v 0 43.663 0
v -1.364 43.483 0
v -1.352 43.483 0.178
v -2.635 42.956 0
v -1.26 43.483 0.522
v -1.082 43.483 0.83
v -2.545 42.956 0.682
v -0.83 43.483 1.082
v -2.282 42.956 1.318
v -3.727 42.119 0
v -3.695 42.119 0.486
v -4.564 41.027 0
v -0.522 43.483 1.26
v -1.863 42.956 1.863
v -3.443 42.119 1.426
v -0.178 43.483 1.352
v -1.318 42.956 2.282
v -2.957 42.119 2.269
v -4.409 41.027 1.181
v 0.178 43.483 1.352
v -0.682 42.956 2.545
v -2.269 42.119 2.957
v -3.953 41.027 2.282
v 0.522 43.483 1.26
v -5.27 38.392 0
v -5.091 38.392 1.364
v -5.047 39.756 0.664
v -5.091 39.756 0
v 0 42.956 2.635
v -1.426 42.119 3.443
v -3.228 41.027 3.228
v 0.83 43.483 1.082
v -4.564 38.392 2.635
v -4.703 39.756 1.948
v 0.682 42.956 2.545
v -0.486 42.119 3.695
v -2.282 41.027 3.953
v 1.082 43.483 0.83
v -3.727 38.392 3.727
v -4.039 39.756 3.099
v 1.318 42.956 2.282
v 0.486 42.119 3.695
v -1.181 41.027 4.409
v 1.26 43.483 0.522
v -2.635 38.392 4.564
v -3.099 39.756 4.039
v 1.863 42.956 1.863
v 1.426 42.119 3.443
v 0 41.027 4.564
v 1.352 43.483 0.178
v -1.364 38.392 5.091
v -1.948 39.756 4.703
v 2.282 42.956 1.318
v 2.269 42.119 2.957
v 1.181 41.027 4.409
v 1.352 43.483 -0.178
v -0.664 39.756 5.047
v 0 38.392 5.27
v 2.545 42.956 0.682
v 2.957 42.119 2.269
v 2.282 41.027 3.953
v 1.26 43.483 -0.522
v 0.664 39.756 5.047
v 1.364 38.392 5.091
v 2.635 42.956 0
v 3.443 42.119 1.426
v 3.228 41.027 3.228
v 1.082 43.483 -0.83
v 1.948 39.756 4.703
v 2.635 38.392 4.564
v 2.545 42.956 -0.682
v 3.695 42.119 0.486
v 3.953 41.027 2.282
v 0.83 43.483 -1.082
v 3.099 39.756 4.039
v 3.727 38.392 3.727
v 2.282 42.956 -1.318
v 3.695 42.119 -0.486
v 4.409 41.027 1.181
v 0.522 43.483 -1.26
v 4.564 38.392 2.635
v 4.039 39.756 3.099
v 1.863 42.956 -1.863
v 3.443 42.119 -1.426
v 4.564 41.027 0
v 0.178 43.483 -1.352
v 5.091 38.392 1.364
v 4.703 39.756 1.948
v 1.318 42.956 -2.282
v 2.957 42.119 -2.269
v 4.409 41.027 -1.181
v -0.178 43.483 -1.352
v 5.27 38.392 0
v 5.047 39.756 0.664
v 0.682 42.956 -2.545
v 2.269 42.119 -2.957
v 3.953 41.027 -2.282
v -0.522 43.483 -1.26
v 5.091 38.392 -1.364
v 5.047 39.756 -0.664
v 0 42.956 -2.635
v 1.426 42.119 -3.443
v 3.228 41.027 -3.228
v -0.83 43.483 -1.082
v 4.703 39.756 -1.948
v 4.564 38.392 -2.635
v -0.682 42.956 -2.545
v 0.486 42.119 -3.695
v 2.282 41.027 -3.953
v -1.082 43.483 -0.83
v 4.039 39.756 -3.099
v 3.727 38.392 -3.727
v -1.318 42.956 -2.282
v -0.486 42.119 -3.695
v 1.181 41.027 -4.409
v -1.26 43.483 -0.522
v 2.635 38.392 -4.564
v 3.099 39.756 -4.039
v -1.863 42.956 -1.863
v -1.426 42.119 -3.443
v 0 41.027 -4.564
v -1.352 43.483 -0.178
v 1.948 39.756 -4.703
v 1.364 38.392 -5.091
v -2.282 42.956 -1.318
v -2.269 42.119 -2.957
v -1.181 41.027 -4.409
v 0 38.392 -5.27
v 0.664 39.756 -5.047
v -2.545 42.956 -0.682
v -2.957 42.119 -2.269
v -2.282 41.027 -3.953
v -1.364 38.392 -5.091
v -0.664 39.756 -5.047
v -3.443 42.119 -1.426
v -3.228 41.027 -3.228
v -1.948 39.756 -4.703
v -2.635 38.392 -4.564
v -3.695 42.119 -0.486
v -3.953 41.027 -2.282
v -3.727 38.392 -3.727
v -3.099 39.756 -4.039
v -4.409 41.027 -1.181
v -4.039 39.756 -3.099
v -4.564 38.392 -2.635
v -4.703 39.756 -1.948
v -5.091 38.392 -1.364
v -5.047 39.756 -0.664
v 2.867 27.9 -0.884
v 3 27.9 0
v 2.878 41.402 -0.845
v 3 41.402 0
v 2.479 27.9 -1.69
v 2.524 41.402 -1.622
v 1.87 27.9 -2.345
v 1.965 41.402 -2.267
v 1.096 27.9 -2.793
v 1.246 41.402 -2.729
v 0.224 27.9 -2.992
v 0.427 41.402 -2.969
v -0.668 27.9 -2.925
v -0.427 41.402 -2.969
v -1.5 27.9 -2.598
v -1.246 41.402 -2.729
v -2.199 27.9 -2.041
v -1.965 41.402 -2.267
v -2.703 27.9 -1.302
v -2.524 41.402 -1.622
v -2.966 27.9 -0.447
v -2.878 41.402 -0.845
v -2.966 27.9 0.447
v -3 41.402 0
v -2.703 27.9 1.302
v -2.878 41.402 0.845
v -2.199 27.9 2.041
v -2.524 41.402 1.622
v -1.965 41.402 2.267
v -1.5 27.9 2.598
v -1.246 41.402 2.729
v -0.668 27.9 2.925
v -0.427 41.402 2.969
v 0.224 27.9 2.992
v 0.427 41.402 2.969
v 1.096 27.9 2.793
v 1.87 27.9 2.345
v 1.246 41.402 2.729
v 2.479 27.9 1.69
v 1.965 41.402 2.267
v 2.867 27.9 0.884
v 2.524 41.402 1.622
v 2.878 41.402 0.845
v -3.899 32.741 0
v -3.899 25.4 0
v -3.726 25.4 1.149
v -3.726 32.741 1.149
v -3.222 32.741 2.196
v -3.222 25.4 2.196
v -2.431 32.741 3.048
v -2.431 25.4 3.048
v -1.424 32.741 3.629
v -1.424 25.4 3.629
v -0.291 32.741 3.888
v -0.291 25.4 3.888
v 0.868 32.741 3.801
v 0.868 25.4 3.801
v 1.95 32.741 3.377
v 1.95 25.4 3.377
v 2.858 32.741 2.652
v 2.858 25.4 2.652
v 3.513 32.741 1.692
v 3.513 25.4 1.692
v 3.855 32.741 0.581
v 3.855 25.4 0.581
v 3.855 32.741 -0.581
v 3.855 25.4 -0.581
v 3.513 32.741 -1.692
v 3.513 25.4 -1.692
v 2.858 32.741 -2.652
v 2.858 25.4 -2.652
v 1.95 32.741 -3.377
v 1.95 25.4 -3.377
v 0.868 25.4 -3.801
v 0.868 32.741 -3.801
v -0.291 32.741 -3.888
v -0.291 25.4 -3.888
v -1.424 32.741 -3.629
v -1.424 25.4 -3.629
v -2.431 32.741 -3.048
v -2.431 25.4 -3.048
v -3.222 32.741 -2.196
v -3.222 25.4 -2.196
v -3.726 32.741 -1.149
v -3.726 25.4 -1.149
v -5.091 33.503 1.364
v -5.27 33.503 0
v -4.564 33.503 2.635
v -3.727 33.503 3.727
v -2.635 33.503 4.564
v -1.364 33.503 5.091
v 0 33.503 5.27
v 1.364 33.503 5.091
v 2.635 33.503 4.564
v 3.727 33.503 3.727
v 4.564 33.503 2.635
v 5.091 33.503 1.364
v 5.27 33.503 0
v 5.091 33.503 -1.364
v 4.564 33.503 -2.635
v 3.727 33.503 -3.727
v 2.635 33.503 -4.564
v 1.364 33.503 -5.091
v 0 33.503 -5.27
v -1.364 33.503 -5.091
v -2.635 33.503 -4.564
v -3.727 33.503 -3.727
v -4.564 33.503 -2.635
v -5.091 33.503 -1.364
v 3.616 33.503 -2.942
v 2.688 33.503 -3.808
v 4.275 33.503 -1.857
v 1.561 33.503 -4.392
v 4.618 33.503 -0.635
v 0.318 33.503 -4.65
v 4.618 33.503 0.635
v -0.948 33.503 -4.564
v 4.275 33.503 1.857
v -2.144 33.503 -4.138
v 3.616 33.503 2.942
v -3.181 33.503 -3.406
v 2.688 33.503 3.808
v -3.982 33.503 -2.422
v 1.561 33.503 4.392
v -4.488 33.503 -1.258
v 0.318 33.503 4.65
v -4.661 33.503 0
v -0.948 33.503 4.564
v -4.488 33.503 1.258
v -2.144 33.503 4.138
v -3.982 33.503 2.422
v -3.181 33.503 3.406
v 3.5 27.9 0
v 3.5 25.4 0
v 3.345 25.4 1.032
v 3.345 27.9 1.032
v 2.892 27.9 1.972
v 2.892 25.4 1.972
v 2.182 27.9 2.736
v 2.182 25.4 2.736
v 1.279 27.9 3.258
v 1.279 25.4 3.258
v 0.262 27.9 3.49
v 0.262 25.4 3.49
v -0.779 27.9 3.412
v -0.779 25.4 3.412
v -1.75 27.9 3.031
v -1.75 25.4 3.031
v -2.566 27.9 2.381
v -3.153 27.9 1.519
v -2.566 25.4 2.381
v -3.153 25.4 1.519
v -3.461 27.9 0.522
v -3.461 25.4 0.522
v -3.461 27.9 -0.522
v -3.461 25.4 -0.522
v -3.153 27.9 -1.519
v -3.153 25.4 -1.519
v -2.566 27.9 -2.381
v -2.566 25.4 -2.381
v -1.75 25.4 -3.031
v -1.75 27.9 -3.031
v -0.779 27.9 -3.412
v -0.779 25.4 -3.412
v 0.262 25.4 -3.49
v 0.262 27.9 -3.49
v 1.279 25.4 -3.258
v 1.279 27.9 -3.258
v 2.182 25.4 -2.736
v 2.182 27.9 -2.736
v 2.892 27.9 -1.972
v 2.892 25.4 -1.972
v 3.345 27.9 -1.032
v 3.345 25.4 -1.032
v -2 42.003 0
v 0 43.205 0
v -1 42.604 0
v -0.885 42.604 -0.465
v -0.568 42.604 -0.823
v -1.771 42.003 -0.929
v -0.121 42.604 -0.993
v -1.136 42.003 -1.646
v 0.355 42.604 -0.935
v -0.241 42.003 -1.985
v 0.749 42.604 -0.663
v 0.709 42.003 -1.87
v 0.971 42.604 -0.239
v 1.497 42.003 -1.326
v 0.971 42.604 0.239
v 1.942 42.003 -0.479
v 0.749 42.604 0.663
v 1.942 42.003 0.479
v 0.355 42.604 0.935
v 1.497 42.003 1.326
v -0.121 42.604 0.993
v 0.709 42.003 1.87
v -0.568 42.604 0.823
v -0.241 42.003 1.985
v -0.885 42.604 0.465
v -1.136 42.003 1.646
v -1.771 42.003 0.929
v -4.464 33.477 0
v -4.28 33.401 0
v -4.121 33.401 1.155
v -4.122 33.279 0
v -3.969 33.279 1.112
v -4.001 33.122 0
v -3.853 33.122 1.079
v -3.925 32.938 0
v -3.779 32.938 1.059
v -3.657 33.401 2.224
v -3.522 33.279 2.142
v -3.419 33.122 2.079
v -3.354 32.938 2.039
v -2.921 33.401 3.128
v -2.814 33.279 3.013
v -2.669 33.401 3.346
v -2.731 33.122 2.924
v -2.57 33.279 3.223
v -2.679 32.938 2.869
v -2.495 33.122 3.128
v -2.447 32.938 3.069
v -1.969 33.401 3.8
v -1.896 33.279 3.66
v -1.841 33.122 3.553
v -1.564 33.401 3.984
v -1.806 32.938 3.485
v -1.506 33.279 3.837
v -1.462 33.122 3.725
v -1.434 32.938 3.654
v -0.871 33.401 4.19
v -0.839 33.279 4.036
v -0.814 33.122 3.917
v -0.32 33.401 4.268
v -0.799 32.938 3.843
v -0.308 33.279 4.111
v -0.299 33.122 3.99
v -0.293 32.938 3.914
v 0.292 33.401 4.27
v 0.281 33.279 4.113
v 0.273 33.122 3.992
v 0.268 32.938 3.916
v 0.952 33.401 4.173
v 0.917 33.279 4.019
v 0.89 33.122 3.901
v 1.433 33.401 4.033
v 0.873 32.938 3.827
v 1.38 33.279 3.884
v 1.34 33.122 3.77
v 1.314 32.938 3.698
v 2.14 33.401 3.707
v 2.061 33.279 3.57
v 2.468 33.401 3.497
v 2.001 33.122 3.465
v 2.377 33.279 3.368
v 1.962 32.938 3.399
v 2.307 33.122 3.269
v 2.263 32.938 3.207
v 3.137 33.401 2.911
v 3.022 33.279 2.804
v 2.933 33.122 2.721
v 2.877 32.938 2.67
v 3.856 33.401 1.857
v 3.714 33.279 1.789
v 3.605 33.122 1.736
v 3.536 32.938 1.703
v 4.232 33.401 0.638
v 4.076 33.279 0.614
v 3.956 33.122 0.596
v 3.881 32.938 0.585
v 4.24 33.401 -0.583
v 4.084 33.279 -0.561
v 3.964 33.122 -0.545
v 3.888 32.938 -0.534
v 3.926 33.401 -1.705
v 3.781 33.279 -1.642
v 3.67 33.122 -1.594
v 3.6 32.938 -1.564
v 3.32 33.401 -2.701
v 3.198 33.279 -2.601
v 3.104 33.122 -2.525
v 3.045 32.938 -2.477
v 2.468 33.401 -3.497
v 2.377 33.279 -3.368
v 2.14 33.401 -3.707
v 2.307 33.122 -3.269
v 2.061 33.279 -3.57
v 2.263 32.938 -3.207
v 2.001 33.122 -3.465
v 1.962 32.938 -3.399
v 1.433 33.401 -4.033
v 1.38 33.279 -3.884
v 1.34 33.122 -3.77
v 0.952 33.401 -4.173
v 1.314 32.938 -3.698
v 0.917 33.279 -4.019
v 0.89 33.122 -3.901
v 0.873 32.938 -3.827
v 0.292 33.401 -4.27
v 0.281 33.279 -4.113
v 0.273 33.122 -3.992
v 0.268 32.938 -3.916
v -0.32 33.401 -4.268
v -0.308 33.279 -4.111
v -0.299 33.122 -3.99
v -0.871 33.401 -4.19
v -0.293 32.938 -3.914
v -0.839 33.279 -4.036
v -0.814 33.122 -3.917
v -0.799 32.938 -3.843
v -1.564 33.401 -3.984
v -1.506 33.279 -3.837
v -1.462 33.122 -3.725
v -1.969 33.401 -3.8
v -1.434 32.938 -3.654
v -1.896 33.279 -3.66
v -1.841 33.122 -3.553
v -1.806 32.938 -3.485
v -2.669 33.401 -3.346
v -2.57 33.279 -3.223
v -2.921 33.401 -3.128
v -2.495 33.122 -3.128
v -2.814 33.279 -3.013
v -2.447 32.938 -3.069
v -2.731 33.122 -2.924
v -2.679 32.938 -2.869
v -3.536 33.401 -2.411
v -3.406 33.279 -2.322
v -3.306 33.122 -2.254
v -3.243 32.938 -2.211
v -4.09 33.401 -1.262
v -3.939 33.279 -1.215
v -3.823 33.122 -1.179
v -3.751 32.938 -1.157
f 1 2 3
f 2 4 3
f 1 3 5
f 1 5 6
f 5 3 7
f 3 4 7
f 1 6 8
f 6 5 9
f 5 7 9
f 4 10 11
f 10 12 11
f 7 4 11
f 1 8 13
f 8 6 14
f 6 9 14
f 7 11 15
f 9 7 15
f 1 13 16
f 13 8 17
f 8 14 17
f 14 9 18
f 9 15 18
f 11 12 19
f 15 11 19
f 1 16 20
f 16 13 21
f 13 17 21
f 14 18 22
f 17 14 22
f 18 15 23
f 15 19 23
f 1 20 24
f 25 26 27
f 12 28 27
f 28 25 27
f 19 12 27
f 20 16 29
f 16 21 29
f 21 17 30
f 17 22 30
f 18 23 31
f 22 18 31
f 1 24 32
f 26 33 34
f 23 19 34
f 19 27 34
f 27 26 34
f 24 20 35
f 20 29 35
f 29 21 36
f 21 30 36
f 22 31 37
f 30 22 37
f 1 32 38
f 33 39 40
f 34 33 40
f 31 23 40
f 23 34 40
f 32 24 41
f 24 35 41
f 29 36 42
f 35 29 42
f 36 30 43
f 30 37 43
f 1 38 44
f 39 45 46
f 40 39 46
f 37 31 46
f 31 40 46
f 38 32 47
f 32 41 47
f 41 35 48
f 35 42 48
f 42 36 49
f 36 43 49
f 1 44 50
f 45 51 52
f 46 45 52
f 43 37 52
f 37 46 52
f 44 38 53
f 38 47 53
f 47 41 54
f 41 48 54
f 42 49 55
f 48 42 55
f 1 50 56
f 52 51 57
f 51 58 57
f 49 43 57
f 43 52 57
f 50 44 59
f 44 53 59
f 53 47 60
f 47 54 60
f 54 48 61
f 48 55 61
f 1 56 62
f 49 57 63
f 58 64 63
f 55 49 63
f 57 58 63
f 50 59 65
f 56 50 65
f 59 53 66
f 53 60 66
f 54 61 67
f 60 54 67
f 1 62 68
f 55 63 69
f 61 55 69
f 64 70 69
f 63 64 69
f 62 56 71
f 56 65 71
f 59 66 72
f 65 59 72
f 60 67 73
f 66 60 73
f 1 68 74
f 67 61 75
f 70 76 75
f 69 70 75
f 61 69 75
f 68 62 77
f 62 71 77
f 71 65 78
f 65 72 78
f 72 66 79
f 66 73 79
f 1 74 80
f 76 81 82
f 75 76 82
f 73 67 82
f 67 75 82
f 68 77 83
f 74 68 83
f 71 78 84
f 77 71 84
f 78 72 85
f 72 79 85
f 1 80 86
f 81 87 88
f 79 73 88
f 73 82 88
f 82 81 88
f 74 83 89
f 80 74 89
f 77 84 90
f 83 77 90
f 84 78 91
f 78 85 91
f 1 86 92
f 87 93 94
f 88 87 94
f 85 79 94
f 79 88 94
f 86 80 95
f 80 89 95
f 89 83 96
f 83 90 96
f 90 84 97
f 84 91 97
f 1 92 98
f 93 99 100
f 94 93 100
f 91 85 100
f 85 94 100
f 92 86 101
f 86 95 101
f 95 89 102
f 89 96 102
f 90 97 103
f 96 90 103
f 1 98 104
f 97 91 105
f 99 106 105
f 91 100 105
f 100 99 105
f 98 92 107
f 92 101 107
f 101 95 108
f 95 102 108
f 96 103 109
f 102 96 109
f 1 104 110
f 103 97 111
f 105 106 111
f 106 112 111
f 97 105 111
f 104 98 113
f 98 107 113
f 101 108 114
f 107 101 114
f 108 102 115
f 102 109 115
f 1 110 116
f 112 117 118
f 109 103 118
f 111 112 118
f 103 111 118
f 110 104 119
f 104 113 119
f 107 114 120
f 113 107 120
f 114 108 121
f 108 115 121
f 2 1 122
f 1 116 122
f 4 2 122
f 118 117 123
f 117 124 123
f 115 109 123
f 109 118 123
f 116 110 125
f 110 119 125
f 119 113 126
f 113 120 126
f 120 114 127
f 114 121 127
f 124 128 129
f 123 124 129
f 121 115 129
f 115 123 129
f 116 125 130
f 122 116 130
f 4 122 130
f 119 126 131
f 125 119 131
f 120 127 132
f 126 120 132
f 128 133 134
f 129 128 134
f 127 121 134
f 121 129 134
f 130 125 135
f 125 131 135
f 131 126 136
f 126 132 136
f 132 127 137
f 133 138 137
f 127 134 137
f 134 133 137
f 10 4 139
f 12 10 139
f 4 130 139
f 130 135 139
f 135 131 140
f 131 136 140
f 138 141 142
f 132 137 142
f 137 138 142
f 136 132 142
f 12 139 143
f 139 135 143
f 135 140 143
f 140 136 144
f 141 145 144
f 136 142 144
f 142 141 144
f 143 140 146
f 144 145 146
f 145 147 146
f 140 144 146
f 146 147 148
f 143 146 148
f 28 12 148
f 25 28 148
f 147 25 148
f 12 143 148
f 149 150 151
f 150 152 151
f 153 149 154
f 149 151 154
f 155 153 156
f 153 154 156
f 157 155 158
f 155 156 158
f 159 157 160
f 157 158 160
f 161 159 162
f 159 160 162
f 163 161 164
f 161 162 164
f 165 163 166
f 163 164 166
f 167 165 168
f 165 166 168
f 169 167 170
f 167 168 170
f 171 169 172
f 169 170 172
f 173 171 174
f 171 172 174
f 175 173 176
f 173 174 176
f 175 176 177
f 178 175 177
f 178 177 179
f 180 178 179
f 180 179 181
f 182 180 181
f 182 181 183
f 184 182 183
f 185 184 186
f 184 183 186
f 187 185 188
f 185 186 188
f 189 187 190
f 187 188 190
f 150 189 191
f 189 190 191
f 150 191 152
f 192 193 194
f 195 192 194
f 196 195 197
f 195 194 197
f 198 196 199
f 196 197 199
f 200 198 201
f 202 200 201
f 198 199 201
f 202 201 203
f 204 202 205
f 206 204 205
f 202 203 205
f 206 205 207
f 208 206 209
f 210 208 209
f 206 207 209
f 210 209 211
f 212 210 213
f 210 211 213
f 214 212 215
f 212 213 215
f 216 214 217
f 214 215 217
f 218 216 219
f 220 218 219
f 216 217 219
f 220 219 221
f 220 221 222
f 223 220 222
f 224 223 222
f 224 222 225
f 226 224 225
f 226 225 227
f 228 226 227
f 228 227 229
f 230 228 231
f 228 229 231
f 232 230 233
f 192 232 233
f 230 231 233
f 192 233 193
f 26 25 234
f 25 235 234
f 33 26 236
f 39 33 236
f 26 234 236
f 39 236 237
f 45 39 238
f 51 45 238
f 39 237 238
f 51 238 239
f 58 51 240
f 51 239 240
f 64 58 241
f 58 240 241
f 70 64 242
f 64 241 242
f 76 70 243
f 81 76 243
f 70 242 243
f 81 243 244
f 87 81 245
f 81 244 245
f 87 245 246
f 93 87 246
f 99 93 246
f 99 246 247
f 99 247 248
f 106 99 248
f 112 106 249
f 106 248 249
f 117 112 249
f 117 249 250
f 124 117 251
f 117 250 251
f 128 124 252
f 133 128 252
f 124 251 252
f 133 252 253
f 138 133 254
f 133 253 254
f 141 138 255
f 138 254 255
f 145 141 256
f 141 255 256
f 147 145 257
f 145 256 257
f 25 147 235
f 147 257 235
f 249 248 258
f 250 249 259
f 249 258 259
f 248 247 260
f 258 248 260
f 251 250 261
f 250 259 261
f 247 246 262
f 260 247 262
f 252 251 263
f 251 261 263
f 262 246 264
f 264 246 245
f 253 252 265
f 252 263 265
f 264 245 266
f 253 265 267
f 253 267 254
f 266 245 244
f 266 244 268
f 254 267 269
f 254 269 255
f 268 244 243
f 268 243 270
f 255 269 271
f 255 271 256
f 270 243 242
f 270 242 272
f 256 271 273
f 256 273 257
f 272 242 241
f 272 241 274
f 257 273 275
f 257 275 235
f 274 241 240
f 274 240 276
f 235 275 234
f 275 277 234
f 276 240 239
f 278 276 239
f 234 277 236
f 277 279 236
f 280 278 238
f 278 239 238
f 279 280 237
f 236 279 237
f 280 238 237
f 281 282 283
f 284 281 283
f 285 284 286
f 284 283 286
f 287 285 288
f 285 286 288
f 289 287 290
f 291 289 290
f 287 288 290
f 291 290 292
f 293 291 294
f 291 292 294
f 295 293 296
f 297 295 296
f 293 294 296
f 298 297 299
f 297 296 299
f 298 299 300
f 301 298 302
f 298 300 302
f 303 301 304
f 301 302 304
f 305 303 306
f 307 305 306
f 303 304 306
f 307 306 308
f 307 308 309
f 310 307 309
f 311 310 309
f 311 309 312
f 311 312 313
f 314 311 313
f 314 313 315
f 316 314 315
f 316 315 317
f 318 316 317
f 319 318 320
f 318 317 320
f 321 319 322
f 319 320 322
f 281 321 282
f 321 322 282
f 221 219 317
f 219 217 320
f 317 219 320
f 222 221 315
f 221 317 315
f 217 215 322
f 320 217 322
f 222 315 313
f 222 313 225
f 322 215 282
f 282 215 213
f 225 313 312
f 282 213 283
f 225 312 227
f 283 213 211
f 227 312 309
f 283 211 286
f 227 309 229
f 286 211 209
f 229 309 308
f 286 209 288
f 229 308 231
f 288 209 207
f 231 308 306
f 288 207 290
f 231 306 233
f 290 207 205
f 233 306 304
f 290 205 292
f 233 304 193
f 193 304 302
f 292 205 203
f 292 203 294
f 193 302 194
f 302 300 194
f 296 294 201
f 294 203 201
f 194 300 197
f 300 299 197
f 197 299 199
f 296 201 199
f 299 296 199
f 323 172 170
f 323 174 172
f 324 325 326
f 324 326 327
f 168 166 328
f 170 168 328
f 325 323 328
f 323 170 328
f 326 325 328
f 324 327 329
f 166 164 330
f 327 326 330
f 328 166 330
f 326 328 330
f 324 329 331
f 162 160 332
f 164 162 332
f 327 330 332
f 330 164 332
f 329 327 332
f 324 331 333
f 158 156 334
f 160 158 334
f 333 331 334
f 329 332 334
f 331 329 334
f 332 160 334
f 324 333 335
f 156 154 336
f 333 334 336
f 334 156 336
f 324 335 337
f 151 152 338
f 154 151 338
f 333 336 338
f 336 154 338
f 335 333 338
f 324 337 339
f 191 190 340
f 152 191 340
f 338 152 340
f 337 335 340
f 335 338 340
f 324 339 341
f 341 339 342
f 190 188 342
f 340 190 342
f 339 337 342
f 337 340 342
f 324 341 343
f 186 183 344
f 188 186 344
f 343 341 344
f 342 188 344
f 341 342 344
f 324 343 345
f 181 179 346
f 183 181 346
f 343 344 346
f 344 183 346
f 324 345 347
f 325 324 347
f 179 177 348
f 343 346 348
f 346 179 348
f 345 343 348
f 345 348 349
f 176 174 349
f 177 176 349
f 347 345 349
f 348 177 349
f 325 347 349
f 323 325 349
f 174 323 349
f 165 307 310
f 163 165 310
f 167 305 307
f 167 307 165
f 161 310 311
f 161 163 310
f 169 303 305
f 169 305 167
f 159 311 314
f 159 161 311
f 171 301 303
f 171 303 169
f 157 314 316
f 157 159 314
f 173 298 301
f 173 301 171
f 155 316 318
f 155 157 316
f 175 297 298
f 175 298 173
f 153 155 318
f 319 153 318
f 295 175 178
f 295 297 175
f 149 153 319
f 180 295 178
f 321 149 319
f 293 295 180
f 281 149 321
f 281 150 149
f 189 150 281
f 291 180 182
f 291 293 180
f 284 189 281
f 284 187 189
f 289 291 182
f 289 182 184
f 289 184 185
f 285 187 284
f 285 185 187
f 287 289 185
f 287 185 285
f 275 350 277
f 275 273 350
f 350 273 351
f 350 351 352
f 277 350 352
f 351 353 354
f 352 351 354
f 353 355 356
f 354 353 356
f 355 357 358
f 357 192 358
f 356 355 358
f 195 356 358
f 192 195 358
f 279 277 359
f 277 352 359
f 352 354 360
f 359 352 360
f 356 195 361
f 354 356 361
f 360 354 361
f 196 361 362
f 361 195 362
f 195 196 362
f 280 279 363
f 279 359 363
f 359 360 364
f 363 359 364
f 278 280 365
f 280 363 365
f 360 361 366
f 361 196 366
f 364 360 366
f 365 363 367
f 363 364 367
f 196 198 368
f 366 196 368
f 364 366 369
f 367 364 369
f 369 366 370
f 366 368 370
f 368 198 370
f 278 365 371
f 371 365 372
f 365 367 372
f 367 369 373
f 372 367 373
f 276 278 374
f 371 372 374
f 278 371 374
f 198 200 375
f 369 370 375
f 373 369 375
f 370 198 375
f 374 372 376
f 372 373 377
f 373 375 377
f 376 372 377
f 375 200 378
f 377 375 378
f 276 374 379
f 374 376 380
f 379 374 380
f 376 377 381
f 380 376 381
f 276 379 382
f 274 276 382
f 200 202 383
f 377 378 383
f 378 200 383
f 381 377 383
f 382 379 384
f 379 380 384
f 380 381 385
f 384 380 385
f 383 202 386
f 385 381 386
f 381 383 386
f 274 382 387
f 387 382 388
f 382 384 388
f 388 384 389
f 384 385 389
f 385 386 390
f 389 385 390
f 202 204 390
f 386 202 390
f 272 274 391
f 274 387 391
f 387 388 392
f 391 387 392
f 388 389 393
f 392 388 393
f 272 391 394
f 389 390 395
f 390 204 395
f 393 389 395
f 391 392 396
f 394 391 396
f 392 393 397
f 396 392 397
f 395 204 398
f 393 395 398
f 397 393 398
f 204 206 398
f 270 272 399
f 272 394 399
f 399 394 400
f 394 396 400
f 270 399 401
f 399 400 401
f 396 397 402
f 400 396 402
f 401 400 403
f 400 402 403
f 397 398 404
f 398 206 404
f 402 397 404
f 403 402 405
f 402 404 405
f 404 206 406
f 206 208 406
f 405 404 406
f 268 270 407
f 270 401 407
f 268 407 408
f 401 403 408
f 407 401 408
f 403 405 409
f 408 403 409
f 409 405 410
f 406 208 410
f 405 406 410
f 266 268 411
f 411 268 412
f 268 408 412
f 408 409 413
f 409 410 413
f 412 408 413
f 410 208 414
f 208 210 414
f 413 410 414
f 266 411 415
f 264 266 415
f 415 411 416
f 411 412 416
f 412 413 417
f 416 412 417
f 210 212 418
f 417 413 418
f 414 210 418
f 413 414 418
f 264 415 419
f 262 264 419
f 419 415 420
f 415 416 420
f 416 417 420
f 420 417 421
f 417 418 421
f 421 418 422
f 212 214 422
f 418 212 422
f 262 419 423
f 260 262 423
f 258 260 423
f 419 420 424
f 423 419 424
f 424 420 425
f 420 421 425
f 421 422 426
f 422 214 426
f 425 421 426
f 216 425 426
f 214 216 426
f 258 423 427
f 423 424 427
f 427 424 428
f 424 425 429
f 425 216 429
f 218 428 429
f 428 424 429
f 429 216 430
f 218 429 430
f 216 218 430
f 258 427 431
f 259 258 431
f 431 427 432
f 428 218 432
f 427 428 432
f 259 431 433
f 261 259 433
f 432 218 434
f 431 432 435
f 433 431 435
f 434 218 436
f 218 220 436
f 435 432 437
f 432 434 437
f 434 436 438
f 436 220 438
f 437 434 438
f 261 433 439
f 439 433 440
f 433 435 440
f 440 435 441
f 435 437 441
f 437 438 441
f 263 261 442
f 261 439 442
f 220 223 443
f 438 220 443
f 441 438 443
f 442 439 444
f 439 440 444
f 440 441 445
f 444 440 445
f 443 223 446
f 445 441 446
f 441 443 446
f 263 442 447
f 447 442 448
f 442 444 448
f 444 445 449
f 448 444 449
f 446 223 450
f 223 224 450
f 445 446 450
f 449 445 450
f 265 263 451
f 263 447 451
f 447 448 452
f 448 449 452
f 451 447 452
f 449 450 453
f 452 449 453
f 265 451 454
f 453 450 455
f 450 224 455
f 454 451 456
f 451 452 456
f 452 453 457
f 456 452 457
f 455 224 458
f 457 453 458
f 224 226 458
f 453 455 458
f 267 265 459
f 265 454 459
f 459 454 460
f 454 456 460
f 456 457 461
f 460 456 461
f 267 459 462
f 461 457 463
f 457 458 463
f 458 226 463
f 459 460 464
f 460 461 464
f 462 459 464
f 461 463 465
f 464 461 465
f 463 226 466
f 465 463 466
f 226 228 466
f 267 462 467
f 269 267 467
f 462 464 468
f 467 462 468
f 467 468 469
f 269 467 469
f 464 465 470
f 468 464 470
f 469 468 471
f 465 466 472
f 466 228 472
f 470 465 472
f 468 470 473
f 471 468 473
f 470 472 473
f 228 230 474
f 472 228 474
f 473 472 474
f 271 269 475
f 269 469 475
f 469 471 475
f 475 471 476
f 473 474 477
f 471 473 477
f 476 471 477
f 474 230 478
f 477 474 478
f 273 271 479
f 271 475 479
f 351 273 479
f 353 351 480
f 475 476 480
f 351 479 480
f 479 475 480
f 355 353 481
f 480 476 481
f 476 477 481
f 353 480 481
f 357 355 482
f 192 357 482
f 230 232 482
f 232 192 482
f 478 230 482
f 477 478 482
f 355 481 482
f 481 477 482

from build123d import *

# Parameters (mm, degrees)
M7X1_0_TAPPED_HOLE1_D     = 6
M7X1_0_TAPPED_HOLE1_DEPTH = 16.002
M7X1_0_TAPPED_HOLE1_TIP   = 1.802581857
SKETCH4_R                 = 3.5
CUT_EXTRUDE1_DEPTH        = 2.5
FILLET1_R                 = 0.762


with BuildPart() as part:
    # Sketch1 → Revolve1 (revolve)
    with BuildSketch(Plane.XY):
        with BuildLine():
            Line((-5.2705, 38.3921), (-5.2705, 33.5026))
            Line((-5.2705, 33.5026), (-3.899, 33.5026))
            Line((-3.899, 33.5026), (-3.899, 25.4))
            Line((-3.899, 25.4), (0, 25.4))
            Line((0, 25.4), (0, 43.6626))
            ThreePointArc((0, 43.6626), (-3.72680629, 42.11890629), (-5.2705, 38.3921))
        make_face()
    revolve(axis=Axis((0, 25.4, 0), (0, 1, 0)))

    # M7x1.0 Tapped Hole1
    with Locations(Plane(origin=(0, 25.4, 0), x_dir=(-1, 0, 0), z_dir=(0, -1, 0))):
        with Locations((0, 0)):
            Hole(M7X1_0_TAPPED_HOLE1_D / 2, depth=M7X1_0_TAPPED_HOLE1_DEPTH)
            with Locations((0, 0, -(M7X1_0_TAPPED_HOLE1_DEPTH + M7X1_0_TAPPED_HOLE1_TIP / 2))):  # 118° drill point
                Cone(0, M7X1_0_TAPPED_HOLE1_D / 2, M7X1_0_TAPPED_HOLE1_TIP, mode=Mode.SUBTRACT)

    # Sketch4 → Cut-Extrude1 (cut)
    with BuildSketch(Plane.XZ.offset(-25.4)):
        Circle(SKETCH4_R)
    extrude(amount=-CUT_EXTRUDE1_DEPTH, mode=Mode.SUBTRACT)

    # Fillet1
    fillet1_edges = [part.edges().sort_by_distance(p)[0] for p in [
        (3.899, 33.5026, 0),
    ]]
    fillet(fillet1_edges, radius=FILLET1_R)


solid = part.part
